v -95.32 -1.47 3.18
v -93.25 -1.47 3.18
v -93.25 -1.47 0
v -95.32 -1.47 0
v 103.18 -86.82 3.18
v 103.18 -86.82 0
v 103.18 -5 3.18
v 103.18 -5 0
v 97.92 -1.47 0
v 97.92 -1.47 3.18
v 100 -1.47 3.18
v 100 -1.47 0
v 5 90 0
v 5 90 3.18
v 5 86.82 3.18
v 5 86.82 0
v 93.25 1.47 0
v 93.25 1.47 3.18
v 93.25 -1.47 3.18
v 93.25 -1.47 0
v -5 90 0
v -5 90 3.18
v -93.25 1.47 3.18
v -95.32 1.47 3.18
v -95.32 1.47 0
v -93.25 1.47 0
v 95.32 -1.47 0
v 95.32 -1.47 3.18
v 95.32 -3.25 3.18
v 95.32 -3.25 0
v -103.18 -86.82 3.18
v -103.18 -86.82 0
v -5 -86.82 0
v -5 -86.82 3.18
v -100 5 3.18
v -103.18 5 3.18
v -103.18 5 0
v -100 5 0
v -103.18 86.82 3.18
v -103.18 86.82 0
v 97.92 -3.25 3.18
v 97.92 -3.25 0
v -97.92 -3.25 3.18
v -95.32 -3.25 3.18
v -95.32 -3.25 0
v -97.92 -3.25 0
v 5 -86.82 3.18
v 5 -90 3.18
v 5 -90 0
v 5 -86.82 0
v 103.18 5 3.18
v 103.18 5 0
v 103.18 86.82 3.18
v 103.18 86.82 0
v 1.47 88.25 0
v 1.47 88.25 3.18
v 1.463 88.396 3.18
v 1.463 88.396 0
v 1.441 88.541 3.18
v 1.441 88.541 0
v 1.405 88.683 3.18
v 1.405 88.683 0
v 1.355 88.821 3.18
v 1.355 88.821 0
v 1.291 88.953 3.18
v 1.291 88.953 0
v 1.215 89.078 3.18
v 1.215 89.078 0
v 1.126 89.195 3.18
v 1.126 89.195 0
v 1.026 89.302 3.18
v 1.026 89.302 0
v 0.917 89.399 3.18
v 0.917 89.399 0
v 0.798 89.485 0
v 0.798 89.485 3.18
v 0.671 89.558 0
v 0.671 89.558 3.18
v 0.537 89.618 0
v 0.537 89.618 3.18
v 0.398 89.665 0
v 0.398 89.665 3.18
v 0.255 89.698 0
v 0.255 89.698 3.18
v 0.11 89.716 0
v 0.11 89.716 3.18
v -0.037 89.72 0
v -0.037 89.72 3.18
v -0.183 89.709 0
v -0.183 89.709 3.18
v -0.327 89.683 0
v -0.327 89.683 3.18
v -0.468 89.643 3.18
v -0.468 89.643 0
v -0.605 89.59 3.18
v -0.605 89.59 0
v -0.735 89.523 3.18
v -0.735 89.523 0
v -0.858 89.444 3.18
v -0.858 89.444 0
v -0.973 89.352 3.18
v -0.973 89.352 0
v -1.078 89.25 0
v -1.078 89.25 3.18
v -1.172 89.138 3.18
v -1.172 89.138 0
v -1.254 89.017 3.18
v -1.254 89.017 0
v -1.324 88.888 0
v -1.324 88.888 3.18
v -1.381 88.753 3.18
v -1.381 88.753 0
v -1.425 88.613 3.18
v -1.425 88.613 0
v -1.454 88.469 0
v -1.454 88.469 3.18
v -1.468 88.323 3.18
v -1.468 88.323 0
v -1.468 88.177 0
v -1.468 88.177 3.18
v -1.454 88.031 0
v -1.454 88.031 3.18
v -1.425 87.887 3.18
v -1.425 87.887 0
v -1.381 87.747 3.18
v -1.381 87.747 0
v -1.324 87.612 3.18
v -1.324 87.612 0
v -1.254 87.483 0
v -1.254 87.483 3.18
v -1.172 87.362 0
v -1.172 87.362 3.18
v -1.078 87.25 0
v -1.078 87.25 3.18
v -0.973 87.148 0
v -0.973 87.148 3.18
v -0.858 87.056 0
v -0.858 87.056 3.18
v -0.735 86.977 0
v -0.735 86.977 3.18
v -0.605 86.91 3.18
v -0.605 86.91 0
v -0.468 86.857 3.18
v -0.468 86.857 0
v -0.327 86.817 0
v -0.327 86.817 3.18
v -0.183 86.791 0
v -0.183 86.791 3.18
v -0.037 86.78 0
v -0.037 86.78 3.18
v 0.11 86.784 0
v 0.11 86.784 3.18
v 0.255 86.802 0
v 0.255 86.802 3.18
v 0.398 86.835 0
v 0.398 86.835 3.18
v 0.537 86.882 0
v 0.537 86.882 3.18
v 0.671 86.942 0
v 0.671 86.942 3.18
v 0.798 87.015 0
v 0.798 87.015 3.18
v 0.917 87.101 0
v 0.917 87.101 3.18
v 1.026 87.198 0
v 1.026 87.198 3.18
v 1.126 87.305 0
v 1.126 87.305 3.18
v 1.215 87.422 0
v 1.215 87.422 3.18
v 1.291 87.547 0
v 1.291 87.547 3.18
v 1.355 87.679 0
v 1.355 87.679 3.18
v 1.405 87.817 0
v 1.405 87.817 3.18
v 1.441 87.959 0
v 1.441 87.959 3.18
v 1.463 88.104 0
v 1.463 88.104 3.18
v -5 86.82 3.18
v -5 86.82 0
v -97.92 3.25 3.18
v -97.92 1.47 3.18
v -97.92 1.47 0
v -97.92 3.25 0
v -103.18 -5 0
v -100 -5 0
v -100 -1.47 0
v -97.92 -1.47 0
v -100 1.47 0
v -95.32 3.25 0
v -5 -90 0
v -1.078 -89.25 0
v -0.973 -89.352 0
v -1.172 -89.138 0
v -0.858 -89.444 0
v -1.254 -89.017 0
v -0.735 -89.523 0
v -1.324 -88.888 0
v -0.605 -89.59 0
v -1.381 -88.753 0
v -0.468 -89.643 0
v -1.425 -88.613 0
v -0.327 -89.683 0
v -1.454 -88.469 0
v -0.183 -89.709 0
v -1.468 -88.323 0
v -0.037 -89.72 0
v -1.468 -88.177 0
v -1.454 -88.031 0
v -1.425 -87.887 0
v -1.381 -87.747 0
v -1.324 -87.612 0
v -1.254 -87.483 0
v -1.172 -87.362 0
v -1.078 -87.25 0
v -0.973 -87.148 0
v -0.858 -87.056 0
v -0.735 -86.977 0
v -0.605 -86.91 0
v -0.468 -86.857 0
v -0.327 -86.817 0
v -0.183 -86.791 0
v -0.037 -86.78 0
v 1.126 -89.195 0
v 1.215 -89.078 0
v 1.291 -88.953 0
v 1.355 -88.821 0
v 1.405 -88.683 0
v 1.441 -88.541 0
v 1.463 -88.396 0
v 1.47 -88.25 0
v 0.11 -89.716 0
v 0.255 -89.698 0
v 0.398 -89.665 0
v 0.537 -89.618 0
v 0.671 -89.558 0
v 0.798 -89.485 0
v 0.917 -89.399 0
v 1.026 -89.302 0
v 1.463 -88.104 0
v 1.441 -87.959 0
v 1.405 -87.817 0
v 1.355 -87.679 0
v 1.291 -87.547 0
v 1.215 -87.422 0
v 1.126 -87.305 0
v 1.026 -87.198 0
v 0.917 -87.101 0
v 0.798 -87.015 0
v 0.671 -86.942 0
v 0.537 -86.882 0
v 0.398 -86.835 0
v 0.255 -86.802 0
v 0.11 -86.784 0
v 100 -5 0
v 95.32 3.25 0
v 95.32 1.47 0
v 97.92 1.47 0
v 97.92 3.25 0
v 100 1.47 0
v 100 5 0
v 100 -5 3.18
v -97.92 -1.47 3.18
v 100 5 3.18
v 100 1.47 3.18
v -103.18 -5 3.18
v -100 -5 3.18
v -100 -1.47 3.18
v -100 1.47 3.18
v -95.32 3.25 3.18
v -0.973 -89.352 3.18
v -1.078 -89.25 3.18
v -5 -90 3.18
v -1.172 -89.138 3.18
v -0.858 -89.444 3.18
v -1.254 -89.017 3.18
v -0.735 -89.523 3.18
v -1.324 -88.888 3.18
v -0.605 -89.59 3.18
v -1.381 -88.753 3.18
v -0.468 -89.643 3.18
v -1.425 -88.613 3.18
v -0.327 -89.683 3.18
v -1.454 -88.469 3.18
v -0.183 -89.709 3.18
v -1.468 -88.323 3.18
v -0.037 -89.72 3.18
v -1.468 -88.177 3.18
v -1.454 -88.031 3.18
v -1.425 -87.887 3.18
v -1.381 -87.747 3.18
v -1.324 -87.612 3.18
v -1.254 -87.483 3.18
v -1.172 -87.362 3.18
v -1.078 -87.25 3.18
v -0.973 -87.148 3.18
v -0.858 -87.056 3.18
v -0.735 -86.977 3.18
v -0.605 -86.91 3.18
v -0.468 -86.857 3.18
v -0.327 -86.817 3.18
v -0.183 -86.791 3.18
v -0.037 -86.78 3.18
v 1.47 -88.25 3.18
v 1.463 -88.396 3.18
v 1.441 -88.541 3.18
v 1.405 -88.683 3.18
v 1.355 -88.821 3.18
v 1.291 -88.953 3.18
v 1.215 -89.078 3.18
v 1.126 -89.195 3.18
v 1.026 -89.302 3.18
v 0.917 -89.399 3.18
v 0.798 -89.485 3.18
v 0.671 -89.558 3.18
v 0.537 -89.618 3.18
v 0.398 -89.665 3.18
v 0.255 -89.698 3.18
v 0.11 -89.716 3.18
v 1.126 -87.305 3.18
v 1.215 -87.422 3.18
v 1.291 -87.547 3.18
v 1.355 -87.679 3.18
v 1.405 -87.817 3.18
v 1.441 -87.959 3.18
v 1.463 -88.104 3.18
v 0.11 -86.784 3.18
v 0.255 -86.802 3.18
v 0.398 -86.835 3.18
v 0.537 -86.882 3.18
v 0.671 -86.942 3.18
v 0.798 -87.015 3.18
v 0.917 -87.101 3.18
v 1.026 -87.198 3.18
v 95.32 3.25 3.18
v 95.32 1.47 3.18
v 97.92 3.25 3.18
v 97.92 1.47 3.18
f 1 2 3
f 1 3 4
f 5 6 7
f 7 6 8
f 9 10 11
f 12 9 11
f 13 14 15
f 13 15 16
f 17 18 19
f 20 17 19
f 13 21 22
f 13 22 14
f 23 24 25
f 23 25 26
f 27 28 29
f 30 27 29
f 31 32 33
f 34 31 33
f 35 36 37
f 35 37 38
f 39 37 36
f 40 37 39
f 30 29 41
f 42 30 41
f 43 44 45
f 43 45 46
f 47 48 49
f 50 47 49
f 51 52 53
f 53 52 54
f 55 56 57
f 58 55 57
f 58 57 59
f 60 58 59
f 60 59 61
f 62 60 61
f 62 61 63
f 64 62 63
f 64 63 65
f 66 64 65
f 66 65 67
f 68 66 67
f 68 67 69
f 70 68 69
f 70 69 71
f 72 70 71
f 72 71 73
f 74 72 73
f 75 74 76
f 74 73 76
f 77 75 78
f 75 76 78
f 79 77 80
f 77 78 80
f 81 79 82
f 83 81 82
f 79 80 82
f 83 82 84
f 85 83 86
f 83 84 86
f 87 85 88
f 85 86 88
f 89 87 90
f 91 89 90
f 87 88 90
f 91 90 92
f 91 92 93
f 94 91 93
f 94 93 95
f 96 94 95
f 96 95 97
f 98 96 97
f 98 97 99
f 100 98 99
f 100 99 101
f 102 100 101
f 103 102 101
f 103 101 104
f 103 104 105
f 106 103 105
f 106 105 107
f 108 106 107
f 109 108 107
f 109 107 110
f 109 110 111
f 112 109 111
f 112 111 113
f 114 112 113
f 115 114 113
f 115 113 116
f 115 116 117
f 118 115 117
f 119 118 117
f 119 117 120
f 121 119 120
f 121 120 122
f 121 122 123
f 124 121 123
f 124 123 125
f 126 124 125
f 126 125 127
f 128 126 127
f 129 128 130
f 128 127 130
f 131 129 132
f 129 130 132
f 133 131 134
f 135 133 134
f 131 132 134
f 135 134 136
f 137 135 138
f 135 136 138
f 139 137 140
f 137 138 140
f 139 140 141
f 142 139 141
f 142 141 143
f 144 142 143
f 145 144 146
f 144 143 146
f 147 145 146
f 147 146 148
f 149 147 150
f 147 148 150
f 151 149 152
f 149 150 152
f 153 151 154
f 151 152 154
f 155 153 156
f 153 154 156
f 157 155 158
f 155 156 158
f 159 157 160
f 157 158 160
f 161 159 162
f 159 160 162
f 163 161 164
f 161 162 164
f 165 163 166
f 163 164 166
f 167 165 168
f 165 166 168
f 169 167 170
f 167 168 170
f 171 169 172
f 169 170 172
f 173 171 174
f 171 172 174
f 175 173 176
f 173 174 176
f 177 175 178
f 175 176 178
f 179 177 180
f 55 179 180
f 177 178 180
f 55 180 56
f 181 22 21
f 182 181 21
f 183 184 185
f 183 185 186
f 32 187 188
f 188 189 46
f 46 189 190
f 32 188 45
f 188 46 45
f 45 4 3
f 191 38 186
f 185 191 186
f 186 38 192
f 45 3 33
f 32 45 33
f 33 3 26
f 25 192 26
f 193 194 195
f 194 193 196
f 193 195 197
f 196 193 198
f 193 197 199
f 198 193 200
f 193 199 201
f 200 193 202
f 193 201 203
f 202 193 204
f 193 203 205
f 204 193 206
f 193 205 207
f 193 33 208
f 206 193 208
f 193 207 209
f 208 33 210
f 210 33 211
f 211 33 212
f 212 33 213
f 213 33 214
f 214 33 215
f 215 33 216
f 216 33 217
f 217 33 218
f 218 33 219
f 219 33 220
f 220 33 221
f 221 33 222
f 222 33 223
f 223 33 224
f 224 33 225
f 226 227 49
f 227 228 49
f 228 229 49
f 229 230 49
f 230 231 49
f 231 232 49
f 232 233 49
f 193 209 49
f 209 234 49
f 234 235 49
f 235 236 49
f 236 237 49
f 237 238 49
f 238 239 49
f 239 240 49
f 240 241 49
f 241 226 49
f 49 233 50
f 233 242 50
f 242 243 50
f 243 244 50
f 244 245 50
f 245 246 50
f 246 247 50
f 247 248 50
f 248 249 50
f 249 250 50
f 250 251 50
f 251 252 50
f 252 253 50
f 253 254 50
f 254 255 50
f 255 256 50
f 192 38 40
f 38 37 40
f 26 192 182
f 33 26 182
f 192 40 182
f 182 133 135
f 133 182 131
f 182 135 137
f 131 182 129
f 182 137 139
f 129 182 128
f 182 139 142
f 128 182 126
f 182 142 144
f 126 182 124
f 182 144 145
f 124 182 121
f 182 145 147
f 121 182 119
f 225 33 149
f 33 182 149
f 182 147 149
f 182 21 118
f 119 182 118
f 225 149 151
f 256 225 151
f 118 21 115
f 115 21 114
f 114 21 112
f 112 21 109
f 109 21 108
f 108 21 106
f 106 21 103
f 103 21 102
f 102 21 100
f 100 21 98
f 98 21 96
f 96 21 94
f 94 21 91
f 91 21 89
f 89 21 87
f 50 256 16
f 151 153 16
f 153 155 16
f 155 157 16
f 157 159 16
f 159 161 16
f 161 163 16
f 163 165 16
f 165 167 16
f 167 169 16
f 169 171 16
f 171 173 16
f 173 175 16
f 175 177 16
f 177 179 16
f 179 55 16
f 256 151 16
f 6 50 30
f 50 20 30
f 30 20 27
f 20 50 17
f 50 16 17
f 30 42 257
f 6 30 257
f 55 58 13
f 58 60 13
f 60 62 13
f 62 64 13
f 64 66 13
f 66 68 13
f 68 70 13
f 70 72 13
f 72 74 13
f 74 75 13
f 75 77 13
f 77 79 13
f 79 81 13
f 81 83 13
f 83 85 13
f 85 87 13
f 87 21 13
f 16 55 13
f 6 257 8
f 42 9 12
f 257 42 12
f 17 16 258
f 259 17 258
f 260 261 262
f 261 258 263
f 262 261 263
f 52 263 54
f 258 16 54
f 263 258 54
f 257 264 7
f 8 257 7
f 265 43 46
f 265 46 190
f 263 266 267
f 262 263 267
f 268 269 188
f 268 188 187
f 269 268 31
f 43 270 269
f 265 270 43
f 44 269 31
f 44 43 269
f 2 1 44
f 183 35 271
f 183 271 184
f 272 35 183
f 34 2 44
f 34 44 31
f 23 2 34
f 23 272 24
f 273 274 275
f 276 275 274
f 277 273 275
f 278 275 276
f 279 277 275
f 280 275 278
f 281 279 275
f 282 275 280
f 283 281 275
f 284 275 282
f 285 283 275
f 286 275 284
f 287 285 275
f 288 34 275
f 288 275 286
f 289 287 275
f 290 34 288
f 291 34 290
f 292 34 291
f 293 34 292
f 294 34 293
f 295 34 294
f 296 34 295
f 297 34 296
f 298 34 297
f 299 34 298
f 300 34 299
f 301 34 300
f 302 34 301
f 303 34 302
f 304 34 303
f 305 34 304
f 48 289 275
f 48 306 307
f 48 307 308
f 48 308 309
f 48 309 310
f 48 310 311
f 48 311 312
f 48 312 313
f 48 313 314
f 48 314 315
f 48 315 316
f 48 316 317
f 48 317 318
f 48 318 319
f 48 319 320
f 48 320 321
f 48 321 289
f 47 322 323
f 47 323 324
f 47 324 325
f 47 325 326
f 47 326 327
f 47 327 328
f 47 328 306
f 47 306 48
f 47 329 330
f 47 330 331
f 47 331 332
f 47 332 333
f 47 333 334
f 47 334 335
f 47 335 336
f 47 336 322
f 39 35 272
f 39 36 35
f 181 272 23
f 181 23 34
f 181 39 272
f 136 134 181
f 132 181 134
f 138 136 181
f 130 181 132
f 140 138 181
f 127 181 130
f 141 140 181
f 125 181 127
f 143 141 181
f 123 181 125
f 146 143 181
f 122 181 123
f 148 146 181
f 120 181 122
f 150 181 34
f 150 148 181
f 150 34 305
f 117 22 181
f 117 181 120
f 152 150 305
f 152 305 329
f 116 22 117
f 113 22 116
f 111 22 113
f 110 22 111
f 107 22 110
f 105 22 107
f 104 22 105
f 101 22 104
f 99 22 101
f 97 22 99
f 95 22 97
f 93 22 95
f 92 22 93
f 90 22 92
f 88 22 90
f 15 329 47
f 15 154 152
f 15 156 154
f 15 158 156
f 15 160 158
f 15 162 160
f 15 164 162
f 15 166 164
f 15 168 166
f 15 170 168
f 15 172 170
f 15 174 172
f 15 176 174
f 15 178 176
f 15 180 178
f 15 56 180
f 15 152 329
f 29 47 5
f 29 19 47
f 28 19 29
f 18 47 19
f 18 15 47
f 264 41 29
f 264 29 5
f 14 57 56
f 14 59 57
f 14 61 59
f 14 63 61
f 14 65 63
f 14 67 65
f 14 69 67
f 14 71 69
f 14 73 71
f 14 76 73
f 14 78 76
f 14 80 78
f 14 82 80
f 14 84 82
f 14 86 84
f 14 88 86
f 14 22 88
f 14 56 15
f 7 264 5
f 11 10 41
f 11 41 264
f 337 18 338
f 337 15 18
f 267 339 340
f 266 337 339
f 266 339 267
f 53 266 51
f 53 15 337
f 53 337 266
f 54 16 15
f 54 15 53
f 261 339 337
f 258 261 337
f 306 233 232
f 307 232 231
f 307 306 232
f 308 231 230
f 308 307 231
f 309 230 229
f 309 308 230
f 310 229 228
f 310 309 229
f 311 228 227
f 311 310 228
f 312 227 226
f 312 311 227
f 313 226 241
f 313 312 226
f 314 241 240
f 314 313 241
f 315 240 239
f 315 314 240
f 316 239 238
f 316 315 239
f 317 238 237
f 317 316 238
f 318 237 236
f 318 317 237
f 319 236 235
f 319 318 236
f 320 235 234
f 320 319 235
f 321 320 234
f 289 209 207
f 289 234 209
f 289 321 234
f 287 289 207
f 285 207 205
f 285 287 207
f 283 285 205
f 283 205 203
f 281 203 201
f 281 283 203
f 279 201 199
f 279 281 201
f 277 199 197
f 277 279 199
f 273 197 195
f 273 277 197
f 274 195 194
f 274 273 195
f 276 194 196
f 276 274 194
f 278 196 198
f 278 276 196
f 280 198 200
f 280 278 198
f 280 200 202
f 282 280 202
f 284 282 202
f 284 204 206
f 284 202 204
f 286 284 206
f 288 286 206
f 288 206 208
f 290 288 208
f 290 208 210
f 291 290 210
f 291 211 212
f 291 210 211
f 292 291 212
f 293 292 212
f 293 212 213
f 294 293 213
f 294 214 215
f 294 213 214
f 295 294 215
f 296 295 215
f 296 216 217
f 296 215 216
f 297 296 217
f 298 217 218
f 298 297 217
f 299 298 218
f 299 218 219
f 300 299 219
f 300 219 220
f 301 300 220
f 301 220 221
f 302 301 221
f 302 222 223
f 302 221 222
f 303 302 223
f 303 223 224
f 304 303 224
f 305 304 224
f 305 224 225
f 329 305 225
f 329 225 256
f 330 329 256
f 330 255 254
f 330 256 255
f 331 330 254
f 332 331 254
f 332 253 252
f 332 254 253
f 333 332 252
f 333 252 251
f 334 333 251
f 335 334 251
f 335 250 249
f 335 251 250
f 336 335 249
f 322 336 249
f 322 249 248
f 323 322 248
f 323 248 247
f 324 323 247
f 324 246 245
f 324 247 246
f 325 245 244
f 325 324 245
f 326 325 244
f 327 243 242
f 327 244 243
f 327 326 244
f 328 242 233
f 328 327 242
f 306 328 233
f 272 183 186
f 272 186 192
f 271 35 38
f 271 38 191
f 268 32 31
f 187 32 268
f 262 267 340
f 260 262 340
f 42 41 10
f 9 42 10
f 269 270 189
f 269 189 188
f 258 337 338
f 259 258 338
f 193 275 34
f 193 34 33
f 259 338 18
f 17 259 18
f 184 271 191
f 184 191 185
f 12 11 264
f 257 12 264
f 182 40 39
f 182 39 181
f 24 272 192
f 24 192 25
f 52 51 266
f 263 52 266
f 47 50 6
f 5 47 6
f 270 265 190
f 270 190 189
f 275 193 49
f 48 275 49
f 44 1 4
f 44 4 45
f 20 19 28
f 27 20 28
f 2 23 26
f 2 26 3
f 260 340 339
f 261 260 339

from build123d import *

# Parameters (mm, degrees)
SKETCH2_W           = 206.36
SKETCH2_H           = 173.64
BOSS_EXTRUDE1_DEPTH = 3.18
CUT_EXTRUDE1_DEPTH  = 135.884903529
SKETCH9_W           = 10
SKETCH9_H           = 3.18
BOSS_EXTRUDE4_DEPTH = 3.18
SKETCH11_R          = 1.47
CUT_EXTRUDE3_DEPTH  = 137.953367246


with BuildPart() as part:
    # Sketch2 → Boss-Extrude1 (new body)
    with BuildSketch(Plane.XY):
        Rectangle(SKETCH2_W, SKETCH2_H)
    extrude(amount=BOSS_EXTRUDE1_DEPTH)

    # Sketch3 → Cut-Extrude1 (cut, through all)
    with BuildSketch(Plane.XY.offset(3.18)):
        Polygon((-95.32, -1.47), (-95.32, -3.25), (-97.92, -3.25), (-97.92, -1.47), (-100, -1.47), (-100, -5), (-103.18, -5), (-103.18, 5), (-100, 5), (-100, 1.47), (-97.92, 1.47), (-97.92, 3.25), (-95.32, 3.25), (-95.32, 1.47), (-93.25, 1.47), (-93.25, -1.47), align=None)
    cut_extrude1 = extrude(amount=-CUT_EXTRUDE1_DEPTH, mode=Mode.SUBTRACT)

    # Sketch9 → Boss-Extrude4 (add)
    with BuildSketch(Plane(origin=(0, 86.82, 0), x_dir=(1, 0, 0), z_dir=(0, 1, 0))):
        with Locations((0, -1.59)):
            Rectangle(SKETCH9_W, SKETCH9_H)
    boss_extrude4 = extrude(amount=BOSS_EXTRUDE4_DEPTH)

    # Sketch11 → Cut-Extrude3 (cut, through all)
    with BuildSketch(Plane.XY.offset(3.18)):
        with Locations((0, 88.25)):
            Circle(SKETCH11_R)
    cut_extrude3 = extrude(amount=-CUT_EXTRUDE3_DEPTH, mode=Mode.SUBTRACT)

    # Mirror1: Cut-Extrude1 across plane
    add(cut_extrude1.mirror(Plane(origin=(0, 0, 0), x_dir=(0, 0, 1), z_dir=(1, 0, 0))), mode=Mode.SUBTRACT)

    # Mirror2: Boss-Extrude4, Cut-Extrude3 across plane
    add(boss_extrude4.mirror(Plane.ZX))
    add(cut_extrude3.mirror(Plane.ZX), mode=Mode.SUBTRACT)


solid = part.part
